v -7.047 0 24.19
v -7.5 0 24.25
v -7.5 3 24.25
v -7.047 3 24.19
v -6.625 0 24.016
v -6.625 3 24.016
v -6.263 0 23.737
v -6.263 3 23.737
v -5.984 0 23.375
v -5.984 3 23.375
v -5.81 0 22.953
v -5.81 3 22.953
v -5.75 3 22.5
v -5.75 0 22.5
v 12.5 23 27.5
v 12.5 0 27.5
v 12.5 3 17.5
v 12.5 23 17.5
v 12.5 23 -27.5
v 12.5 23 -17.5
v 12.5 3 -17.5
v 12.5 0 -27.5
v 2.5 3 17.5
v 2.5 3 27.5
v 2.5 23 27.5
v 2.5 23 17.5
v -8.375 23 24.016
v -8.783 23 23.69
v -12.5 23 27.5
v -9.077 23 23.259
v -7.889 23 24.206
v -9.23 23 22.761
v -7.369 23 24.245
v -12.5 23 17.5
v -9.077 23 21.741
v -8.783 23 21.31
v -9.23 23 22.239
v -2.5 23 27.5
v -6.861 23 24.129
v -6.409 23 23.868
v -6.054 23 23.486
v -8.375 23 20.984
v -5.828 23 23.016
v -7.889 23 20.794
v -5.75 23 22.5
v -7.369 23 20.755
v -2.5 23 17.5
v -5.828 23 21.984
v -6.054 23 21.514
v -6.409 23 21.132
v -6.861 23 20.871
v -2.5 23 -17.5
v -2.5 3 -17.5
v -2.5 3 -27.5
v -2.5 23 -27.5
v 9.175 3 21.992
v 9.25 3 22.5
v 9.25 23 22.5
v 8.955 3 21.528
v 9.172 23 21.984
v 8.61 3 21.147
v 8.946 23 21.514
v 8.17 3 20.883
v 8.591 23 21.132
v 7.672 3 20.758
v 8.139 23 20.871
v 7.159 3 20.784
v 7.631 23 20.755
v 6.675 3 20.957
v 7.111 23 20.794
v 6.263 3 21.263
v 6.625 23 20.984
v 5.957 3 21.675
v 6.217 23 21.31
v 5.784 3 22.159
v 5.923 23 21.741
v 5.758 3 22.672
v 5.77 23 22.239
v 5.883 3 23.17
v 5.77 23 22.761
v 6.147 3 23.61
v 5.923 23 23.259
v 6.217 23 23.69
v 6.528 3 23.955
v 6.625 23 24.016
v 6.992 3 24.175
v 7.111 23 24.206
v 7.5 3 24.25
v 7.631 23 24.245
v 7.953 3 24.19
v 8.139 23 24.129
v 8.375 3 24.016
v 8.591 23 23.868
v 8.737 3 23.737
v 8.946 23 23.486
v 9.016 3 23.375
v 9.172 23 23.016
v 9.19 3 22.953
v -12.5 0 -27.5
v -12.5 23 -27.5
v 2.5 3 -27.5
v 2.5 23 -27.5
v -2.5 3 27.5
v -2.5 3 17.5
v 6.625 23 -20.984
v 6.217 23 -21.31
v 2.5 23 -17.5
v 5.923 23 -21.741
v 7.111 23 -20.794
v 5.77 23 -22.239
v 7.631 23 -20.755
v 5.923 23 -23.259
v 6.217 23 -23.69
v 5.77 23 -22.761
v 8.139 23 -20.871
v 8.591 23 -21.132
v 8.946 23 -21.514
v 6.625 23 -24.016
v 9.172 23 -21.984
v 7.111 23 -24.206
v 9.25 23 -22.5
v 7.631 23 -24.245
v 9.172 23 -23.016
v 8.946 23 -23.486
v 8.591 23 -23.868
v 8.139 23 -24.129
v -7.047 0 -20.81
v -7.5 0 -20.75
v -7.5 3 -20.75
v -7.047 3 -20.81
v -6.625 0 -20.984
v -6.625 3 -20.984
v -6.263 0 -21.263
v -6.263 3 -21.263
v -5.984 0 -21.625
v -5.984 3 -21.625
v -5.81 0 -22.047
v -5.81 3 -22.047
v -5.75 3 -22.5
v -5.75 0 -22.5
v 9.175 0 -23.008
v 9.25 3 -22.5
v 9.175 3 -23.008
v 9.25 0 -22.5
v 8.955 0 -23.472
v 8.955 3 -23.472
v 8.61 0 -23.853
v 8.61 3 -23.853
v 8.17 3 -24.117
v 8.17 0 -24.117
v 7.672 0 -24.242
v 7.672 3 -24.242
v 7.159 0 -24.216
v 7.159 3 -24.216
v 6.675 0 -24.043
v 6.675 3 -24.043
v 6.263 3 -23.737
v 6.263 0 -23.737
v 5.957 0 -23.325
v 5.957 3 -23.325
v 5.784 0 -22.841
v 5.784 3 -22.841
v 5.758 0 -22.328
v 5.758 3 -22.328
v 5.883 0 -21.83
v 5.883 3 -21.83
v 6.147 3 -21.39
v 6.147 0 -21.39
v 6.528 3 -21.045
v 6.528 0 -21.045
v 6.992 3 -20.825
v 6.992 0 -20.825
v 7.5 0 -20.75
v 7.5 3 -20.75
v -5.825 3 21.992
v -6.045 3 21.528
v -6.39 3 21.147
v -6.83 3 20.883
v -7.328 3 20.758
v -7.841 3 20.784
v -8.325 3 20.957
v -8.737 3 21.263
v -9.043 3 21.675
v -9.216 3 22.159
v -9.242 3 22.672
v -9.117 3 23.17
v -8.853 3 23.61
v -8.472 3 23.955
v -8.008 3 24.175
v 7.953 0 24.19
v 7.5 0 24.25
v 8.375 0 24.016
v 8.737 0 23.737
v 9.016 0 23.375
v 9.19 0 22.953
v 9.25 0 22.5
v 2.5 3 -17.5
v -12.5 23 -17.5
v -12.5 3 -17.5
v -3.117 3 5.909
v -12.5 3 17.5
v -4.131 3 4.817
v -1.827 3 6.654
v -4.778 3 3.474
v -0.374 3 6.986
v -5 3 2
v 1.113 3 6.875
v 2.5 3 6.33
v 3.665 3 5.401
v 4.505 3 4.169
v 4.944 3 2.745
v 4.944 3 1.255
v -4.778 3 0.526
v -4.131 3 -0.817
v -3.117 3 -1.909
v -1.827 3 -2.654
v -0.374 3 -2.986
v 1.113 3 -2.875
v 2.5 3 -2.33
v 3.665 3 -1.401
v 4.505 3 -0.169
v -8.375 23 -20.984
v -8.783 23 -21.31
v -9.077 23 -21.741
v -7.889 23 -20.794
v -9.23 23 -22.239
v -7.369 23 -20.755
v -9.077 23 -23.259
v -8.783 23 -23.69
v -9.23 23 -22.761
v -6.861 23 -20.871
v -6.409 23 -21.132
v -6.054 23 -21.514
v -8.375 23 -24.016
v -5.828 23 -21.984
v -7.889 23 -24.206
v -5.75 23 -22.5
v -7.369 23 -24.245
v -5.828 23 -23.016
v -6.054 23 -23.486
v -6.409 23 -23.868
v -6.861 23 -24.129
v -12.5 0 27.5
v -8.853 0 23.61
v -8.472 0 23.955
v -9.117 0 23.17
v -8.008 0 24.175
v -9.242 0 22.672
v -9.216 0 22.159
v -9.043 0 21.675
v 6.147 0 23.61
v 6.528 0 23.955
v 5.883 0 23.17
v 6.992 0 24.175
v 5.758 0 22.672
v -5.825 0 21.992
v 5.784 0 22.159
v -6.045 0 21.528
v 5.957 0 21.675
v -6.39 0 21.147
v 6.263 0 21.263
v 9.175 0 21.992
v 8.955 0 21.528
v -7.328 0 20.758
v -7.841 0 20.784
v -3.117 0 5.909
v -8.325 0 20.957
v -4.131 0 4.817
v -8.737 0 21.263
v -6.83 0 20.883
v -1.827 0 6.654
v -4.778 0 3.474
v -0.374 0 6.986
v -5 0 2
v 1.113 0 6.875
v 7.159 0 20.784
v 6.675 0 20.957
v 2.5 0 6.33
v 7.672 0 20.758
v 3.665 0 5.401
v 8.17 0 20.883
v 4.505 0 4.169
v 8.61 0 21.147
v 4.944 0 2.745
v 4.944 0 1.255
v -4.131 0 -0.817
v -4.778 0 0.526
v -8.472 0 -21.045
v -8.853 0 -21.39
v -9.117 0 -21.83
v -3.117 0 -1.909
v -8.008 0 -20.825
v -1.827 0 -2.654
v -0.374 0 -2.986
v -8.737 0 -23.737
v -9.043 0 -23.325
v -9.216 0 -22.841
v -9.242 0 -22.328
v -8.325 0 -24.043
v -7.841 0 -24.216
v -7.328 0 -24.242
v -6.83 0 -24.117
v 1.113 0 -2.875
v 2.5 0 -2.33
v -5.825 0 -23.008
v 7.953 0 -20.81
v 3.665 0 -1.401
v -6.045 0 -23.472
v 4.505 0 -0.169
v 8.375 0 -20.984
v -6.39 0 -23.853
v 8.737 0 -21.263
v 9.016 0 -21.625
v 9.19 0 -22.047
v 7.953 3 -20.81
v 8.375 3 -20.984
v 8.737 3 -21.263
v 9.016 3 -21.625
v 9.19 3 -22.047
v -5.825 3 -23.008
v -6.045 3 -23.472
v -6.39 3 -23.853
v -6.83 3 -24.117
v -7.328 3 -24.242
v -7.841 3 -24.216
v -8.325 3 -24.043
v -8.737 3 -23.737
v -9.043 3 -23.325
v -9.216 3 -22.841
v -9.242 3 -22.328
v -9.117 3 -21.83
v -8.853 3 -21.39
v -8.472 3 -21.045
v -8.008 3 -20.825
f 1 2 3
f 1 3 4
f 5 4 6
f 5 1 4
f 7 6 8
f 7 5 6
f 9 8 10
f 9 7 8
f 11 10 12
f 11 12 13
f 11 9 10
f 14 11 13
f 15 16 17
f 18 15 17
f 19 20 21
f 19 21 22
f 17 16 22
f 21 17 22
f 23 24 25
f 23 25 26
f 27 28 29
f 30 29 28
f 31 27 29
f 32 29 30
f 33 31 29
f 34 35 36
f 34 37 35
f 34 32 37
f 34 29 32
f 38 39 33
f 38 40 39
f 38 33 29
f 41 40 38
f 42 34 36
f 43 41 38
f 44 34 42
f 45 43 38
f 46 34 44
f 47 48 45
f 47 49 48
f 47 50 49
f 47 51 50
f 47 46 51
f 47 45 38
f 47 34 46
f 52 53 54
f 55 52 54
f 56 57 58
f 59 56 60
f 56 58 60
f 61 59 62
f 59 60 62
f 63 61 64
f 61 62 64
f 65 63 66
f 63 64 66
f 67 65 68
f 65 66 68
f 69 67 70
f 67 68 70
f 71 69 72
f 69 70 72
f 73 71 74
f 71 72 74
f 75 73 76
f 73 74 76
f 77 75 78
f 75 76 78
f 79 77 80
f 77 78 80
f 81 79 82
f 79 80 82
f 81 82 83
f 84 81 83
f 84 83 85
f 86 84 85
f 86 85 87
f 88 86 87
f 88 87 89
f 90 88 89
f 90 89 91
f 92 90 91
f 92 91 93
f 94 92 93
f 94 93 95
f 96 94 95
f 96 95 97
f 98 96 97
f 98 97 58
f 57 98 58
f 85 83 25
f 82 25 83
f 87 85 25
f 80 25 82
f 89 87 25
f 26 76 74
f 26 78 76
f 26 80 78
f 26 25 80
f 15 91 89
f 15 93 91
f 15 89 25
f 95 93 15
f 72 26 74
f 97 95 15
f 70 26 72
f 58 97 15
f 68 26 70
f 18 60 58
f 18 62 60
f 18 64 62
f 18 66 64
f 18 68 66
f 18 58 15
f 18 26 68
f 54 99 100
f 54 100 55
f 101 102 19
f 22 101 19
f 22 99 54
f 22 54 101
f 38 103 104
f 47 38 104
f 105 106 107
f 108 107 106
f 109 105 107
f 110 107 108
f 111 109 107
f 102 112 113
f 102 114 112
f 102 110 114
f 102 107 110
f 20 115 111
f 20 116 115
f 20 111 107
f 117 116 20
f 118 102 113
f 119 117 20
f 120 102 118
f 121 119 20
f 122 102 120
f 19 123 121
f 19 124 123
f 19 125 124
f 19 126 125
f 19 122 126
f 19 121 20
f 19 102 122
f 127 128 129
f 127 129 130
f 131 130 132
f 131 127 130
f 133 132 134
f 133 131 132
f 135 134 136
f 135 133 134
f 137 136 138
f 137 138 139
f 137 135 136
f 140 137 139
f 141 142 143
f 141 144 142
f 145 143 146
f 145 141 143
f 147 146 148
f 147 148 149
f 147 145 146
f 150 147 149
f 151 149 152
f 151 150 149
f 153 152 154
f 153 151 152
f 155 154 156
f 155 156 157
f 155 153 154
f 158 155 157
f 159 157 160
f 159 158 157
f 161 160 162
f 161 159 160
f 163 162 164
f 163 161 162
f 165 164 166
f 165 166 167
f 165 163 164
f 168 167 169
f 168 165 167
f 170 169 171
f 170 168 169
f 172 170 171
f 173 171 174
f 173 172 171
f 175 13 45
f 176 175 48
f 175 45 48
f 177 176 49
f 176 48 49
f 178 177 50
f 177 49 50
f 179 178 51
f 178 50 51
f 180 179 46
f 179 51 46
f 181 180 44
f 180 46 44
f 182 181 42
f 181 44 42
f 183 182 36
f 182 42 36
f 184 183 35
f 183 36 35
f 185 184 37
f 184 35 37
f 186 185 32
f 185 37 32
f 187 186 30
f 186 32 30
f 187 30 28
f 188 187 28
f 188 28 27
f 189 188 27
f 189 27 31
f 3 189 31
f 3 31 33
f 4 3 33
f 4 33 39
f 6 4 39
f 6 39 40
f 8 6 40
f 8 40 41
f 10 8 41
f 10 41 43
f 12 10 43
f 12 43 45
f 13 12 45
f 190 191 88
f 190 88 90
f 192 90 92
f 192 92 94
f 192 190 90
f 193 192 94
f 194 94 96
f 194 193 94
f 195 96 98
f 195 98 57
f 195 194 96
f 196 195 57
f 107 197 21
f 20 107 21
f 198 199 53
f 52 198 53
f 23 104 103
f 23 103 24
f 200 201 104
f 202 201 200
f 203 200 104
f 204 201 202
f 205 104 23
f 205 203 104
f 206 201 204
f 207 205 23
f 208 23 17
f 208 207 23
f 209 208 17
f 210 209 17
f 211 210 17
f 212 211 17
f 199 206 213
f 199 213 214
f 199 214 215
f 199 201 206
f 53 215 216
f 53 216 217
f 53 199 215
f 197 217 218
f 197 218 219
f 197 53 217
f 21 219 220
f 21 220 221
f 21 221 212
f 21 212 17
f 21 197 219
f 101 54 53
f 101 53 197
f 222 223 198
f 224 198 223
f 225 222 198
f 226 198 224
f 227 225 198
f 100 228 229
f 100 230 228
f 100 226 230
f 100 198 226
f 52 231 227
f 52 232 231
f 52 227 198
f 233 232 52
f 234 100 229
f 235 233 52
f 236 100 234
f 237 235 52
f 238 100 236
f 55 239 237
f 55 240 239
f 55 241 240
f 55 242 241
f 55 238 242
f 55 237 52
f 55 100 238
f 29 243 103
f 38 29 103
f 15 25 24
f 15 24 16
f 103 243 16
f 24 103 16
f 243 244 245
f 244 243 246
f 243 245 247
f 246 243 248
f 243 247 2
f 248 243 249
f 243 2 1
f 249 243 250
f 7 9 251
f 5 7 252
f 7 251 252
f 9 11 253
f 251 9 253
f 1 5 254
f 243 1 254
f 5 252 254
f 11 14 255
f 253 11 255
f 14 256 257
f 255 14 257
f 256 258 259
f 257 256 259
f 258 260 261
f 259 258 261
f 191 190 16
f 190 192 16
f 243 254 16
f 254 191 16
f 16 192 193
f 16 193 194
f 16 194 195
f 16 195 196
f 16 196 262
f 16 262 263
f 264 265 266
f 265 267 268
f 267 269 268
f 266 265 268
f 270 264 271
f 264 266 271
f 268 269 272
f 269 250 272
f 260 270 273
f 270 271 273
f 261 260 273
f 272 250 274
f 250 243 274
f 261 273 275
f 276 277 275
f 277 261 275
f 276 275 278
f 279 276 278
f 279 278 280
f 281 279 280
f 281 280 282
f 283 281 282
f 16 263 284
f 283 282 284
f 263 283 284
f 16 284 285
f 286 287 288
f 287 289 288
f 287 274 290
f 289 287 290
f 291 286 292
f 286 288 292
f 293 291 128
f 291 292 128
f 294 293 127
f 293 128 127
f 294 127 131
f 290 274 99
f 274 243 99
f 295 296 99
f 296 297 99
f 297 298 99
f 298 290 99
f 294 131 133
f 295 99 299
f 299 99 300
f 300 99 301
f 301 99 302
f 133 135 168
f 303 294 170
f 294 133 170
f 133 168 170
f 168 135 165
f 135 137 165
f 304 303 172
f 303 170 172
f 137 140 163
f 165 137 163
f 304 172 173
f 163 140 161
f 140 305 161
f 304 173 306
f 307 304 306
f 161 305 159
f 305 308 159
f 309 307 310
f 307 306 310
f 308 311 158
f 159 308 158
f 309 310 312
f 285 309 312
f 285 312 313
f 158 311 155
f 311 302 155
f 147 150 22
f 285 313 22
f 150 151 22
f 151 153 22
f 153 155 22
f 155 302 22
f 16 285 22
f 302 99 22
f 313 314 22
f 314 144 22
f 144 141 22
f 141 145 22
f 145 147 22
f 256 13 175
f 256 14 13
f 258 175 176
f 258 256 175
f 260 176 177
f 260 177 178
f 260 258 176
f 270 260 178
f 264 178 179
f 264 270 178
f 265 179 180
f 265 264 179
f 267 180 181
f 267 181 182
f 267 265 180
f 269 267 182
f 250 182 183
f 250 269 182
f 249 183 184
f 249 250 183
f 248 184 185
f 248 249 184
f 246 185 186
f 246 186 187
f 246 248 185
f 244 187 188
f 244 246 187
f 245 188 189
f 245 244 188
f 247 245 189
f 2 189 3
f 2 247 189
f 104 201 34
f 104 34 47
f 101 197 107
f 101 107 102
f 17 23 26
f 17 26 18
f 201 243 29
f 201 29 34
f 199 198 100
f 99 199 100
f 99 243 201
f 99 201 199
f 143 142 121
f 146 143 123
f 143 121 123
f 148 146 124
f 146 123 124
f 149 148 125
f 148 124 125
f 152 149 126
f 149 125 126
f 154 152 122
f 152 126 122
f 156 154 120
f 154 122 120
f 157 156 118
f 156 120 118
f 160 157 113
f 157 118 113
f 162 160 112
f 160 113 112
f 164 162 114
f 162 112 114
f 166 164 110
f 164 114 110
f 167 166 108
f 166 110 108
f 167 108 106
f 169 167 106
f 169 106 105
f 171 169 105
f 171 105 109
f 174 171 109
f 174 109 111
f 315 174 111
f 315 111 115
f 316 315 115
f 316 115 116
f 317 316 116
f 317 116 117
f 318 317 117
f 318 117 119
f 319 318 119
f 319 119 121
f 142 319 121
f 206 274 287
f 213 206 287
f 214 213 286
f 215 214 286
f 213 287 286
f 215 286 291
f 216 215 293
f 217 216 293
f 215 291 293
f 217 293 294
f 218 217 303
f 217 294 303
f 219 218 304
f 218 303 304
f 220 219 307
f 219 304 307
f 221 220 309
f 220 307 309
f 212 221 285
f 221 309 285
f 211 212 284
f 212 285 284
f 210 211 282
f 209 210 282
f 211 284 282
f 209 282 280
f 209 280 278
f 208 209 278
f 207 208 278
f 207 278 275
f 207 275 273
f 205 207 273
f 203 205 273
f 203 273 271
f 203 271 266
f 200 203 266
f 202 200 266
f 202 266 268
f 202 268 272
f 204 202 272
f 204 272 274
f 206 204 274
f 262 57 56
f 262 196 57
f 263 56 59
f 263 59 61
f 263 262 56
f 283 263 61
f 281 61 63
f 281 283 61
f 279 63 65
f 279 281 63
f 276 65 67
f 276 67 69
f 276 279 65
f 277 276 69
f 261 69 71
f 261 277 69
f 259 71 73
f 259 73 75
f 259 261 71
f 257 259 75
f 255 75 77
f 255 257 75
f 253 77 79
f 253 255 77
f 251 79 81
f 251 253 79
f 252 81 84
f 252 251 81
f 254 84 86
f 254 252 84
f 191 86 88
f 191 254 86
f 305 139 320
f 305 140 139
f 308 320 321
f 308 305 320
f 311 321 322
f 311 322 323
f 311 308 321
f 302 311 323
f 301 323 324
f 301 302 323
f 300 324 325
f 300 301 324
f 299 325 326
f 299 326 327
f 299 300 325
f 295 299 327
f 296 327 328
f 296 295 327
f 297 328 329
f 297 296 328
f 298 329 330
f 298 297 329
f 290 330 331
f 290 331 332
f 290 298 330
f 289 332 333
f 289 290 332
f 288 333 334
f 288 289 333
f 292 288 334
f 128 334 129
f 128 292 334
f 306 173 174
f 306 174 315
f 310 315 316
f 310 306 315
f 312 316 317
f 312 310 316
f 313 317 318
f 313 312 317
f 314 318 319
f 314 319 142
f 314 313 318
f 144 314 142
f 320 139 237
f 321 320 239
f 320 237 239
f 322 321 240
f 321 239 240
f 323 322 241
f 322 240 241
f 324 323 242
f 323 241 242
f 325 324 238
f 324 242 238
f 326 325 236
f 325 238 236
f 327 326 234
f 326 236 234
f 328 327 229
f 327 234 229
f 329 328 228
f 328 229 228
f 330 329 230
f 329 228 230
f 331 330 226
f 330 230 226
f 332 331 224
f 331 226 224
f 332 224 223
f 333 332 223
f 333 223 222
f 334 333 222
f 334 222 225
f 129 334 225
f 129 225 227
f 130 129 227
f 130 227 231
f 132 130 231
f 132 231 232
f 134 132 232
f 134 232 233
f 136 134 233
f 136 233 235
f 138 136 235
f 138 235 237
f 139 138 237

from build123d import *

# Parameters (mm, degrees)
SKETCH_1_W               = 25
SKETCH_1_H               = 55
EXTRUDE_1_DEPTH          = 3
SKETCH_7_W               = 10
SKETCH_7_H               = 10
EXTRUDE_2_DEPTH          = 20
HOLE_WIZARD_2_D          = 10
SKETCH_4_W               = 1.75
SKETCH_4_H               = 3
HOLE_WIZARD_1_AT_2_COUNT = 2
HOLE_WIZARD_1_AT_2_PITCH = 15
HOLE_WIZARD_1_AT_3_COUNT = 2
HOLE_WIZARD_1_AT_3_PITCH = 47.434164903
HOLE_WIZARD_1_AT_4_COUNT = 2
HOLE_WIZARD_1_AT_4_PITCH = 45
HOLE_WIZARD_3_D          = 3.5


with BuildPart() as part:
    # 草图1 → 凸台-拉伸1 (new body)
    with BuildSketch(Plane(origin=(0, 0, 0), x_dir=(1, 0, 0), z_dir=(0, 1, 0))):
        Rectangle(SKETCH_1_W, SKETCH_1_H)
    extrude(amount=EXTRUDE_1_DEPTH)

    # 草图7 → 凸台-拉伸2 (add)
    with BuildSketch(Plane(origin=(0, 3, 0), x_dir=(1, 0, 0), z_dir=(0, 1, 0))):
        with Locations((-7.5, 22.5)):
            Rectangle(SKETCH_7_W, SKETCH_7_H)
        with Locations((7.5, 22.5)):
            Rectangle(SKETCH_7_W, SKETCH_7_H)
        with Locations((7.5, -22.5)):
            Rectangle(SKETCH_7_W, SKETCH_7_H)
        with Locations((-7.5, -22.5)):
            Rectangle(SKETCH_7_W, SKETCH_7_H)
    extrude(amount=EXTRUDE_2_DEPTH)

    # 孔2 (through all)
    with Locations(Plane(origin=(0, 3, 0), x_dir=(1, 0, 0), z_dir=(0, 1, 0))):
        with Locations((0, -2)):
            Hole(HOLE_WIZARD_2_D / 2)

    # 草图4 → 孔1 (revolve, cut)
    with BuildSketch(Plane(origin=(-7.5, 3, -22.5), x_dir=(0, 0, 1), z_dir=(1, 0, 0))):
        with Locations((0.875, 1.5)):
            Rectangle(SKETCH_4_W, SKETCH_4_H)
    hole_wizard_1 = revolve(axis=Axis((-7.5, -107, -22.5), (0, 1, 0)), mode=Mode.SUBTRACT)

    # 孔1 at 2: 孔1 ×2
    with Locations(*[(i * HOLE_WIZARD_1_AT_2_PITCH, 0, 0) for i in range(1, HOLE_WIZARD_1_AT_2_COUNT)]):
        add(hole_wizard_1, mode=Mode.SUBTRACT)

    # 孔1 at 3: 孔1 ×2
    with Locations(*[Vector(0.3162277660168381, 0, 0.9486832980505139) * (i * HOLE_WIZARD_1_AT_3_PITCH) for i in range(1, HOLE_WIZARD_1_AT_3_COUNT)]):
        add(hole_wizard_1, mode=Mode.SUBTRACT)

    # 孔1 at 4: 孔1 ×2
    with Locations(*[(0, 0, i * HOLE_WIZARD_1_AT_4_PITCH) for i in range(1, HOLE_WIZARD_1_AT_4_COUNT)]):
        add(hole_wizard_1, mode=Mode.SUBTRACT)

    # 孔3 (through all)
    with Locations(Plane(origin=(0, 0, 0), x_dir=(-1, 0, 0), z_dir=(0, -1, 0))):
        with Locations((7.5, 22.5), (-7.5, 22.5), (-7.5, -22.5), (7.5, -22.5)):
            Hole(HOLE_WIZARD_3_D / 2)


solid = part.part
